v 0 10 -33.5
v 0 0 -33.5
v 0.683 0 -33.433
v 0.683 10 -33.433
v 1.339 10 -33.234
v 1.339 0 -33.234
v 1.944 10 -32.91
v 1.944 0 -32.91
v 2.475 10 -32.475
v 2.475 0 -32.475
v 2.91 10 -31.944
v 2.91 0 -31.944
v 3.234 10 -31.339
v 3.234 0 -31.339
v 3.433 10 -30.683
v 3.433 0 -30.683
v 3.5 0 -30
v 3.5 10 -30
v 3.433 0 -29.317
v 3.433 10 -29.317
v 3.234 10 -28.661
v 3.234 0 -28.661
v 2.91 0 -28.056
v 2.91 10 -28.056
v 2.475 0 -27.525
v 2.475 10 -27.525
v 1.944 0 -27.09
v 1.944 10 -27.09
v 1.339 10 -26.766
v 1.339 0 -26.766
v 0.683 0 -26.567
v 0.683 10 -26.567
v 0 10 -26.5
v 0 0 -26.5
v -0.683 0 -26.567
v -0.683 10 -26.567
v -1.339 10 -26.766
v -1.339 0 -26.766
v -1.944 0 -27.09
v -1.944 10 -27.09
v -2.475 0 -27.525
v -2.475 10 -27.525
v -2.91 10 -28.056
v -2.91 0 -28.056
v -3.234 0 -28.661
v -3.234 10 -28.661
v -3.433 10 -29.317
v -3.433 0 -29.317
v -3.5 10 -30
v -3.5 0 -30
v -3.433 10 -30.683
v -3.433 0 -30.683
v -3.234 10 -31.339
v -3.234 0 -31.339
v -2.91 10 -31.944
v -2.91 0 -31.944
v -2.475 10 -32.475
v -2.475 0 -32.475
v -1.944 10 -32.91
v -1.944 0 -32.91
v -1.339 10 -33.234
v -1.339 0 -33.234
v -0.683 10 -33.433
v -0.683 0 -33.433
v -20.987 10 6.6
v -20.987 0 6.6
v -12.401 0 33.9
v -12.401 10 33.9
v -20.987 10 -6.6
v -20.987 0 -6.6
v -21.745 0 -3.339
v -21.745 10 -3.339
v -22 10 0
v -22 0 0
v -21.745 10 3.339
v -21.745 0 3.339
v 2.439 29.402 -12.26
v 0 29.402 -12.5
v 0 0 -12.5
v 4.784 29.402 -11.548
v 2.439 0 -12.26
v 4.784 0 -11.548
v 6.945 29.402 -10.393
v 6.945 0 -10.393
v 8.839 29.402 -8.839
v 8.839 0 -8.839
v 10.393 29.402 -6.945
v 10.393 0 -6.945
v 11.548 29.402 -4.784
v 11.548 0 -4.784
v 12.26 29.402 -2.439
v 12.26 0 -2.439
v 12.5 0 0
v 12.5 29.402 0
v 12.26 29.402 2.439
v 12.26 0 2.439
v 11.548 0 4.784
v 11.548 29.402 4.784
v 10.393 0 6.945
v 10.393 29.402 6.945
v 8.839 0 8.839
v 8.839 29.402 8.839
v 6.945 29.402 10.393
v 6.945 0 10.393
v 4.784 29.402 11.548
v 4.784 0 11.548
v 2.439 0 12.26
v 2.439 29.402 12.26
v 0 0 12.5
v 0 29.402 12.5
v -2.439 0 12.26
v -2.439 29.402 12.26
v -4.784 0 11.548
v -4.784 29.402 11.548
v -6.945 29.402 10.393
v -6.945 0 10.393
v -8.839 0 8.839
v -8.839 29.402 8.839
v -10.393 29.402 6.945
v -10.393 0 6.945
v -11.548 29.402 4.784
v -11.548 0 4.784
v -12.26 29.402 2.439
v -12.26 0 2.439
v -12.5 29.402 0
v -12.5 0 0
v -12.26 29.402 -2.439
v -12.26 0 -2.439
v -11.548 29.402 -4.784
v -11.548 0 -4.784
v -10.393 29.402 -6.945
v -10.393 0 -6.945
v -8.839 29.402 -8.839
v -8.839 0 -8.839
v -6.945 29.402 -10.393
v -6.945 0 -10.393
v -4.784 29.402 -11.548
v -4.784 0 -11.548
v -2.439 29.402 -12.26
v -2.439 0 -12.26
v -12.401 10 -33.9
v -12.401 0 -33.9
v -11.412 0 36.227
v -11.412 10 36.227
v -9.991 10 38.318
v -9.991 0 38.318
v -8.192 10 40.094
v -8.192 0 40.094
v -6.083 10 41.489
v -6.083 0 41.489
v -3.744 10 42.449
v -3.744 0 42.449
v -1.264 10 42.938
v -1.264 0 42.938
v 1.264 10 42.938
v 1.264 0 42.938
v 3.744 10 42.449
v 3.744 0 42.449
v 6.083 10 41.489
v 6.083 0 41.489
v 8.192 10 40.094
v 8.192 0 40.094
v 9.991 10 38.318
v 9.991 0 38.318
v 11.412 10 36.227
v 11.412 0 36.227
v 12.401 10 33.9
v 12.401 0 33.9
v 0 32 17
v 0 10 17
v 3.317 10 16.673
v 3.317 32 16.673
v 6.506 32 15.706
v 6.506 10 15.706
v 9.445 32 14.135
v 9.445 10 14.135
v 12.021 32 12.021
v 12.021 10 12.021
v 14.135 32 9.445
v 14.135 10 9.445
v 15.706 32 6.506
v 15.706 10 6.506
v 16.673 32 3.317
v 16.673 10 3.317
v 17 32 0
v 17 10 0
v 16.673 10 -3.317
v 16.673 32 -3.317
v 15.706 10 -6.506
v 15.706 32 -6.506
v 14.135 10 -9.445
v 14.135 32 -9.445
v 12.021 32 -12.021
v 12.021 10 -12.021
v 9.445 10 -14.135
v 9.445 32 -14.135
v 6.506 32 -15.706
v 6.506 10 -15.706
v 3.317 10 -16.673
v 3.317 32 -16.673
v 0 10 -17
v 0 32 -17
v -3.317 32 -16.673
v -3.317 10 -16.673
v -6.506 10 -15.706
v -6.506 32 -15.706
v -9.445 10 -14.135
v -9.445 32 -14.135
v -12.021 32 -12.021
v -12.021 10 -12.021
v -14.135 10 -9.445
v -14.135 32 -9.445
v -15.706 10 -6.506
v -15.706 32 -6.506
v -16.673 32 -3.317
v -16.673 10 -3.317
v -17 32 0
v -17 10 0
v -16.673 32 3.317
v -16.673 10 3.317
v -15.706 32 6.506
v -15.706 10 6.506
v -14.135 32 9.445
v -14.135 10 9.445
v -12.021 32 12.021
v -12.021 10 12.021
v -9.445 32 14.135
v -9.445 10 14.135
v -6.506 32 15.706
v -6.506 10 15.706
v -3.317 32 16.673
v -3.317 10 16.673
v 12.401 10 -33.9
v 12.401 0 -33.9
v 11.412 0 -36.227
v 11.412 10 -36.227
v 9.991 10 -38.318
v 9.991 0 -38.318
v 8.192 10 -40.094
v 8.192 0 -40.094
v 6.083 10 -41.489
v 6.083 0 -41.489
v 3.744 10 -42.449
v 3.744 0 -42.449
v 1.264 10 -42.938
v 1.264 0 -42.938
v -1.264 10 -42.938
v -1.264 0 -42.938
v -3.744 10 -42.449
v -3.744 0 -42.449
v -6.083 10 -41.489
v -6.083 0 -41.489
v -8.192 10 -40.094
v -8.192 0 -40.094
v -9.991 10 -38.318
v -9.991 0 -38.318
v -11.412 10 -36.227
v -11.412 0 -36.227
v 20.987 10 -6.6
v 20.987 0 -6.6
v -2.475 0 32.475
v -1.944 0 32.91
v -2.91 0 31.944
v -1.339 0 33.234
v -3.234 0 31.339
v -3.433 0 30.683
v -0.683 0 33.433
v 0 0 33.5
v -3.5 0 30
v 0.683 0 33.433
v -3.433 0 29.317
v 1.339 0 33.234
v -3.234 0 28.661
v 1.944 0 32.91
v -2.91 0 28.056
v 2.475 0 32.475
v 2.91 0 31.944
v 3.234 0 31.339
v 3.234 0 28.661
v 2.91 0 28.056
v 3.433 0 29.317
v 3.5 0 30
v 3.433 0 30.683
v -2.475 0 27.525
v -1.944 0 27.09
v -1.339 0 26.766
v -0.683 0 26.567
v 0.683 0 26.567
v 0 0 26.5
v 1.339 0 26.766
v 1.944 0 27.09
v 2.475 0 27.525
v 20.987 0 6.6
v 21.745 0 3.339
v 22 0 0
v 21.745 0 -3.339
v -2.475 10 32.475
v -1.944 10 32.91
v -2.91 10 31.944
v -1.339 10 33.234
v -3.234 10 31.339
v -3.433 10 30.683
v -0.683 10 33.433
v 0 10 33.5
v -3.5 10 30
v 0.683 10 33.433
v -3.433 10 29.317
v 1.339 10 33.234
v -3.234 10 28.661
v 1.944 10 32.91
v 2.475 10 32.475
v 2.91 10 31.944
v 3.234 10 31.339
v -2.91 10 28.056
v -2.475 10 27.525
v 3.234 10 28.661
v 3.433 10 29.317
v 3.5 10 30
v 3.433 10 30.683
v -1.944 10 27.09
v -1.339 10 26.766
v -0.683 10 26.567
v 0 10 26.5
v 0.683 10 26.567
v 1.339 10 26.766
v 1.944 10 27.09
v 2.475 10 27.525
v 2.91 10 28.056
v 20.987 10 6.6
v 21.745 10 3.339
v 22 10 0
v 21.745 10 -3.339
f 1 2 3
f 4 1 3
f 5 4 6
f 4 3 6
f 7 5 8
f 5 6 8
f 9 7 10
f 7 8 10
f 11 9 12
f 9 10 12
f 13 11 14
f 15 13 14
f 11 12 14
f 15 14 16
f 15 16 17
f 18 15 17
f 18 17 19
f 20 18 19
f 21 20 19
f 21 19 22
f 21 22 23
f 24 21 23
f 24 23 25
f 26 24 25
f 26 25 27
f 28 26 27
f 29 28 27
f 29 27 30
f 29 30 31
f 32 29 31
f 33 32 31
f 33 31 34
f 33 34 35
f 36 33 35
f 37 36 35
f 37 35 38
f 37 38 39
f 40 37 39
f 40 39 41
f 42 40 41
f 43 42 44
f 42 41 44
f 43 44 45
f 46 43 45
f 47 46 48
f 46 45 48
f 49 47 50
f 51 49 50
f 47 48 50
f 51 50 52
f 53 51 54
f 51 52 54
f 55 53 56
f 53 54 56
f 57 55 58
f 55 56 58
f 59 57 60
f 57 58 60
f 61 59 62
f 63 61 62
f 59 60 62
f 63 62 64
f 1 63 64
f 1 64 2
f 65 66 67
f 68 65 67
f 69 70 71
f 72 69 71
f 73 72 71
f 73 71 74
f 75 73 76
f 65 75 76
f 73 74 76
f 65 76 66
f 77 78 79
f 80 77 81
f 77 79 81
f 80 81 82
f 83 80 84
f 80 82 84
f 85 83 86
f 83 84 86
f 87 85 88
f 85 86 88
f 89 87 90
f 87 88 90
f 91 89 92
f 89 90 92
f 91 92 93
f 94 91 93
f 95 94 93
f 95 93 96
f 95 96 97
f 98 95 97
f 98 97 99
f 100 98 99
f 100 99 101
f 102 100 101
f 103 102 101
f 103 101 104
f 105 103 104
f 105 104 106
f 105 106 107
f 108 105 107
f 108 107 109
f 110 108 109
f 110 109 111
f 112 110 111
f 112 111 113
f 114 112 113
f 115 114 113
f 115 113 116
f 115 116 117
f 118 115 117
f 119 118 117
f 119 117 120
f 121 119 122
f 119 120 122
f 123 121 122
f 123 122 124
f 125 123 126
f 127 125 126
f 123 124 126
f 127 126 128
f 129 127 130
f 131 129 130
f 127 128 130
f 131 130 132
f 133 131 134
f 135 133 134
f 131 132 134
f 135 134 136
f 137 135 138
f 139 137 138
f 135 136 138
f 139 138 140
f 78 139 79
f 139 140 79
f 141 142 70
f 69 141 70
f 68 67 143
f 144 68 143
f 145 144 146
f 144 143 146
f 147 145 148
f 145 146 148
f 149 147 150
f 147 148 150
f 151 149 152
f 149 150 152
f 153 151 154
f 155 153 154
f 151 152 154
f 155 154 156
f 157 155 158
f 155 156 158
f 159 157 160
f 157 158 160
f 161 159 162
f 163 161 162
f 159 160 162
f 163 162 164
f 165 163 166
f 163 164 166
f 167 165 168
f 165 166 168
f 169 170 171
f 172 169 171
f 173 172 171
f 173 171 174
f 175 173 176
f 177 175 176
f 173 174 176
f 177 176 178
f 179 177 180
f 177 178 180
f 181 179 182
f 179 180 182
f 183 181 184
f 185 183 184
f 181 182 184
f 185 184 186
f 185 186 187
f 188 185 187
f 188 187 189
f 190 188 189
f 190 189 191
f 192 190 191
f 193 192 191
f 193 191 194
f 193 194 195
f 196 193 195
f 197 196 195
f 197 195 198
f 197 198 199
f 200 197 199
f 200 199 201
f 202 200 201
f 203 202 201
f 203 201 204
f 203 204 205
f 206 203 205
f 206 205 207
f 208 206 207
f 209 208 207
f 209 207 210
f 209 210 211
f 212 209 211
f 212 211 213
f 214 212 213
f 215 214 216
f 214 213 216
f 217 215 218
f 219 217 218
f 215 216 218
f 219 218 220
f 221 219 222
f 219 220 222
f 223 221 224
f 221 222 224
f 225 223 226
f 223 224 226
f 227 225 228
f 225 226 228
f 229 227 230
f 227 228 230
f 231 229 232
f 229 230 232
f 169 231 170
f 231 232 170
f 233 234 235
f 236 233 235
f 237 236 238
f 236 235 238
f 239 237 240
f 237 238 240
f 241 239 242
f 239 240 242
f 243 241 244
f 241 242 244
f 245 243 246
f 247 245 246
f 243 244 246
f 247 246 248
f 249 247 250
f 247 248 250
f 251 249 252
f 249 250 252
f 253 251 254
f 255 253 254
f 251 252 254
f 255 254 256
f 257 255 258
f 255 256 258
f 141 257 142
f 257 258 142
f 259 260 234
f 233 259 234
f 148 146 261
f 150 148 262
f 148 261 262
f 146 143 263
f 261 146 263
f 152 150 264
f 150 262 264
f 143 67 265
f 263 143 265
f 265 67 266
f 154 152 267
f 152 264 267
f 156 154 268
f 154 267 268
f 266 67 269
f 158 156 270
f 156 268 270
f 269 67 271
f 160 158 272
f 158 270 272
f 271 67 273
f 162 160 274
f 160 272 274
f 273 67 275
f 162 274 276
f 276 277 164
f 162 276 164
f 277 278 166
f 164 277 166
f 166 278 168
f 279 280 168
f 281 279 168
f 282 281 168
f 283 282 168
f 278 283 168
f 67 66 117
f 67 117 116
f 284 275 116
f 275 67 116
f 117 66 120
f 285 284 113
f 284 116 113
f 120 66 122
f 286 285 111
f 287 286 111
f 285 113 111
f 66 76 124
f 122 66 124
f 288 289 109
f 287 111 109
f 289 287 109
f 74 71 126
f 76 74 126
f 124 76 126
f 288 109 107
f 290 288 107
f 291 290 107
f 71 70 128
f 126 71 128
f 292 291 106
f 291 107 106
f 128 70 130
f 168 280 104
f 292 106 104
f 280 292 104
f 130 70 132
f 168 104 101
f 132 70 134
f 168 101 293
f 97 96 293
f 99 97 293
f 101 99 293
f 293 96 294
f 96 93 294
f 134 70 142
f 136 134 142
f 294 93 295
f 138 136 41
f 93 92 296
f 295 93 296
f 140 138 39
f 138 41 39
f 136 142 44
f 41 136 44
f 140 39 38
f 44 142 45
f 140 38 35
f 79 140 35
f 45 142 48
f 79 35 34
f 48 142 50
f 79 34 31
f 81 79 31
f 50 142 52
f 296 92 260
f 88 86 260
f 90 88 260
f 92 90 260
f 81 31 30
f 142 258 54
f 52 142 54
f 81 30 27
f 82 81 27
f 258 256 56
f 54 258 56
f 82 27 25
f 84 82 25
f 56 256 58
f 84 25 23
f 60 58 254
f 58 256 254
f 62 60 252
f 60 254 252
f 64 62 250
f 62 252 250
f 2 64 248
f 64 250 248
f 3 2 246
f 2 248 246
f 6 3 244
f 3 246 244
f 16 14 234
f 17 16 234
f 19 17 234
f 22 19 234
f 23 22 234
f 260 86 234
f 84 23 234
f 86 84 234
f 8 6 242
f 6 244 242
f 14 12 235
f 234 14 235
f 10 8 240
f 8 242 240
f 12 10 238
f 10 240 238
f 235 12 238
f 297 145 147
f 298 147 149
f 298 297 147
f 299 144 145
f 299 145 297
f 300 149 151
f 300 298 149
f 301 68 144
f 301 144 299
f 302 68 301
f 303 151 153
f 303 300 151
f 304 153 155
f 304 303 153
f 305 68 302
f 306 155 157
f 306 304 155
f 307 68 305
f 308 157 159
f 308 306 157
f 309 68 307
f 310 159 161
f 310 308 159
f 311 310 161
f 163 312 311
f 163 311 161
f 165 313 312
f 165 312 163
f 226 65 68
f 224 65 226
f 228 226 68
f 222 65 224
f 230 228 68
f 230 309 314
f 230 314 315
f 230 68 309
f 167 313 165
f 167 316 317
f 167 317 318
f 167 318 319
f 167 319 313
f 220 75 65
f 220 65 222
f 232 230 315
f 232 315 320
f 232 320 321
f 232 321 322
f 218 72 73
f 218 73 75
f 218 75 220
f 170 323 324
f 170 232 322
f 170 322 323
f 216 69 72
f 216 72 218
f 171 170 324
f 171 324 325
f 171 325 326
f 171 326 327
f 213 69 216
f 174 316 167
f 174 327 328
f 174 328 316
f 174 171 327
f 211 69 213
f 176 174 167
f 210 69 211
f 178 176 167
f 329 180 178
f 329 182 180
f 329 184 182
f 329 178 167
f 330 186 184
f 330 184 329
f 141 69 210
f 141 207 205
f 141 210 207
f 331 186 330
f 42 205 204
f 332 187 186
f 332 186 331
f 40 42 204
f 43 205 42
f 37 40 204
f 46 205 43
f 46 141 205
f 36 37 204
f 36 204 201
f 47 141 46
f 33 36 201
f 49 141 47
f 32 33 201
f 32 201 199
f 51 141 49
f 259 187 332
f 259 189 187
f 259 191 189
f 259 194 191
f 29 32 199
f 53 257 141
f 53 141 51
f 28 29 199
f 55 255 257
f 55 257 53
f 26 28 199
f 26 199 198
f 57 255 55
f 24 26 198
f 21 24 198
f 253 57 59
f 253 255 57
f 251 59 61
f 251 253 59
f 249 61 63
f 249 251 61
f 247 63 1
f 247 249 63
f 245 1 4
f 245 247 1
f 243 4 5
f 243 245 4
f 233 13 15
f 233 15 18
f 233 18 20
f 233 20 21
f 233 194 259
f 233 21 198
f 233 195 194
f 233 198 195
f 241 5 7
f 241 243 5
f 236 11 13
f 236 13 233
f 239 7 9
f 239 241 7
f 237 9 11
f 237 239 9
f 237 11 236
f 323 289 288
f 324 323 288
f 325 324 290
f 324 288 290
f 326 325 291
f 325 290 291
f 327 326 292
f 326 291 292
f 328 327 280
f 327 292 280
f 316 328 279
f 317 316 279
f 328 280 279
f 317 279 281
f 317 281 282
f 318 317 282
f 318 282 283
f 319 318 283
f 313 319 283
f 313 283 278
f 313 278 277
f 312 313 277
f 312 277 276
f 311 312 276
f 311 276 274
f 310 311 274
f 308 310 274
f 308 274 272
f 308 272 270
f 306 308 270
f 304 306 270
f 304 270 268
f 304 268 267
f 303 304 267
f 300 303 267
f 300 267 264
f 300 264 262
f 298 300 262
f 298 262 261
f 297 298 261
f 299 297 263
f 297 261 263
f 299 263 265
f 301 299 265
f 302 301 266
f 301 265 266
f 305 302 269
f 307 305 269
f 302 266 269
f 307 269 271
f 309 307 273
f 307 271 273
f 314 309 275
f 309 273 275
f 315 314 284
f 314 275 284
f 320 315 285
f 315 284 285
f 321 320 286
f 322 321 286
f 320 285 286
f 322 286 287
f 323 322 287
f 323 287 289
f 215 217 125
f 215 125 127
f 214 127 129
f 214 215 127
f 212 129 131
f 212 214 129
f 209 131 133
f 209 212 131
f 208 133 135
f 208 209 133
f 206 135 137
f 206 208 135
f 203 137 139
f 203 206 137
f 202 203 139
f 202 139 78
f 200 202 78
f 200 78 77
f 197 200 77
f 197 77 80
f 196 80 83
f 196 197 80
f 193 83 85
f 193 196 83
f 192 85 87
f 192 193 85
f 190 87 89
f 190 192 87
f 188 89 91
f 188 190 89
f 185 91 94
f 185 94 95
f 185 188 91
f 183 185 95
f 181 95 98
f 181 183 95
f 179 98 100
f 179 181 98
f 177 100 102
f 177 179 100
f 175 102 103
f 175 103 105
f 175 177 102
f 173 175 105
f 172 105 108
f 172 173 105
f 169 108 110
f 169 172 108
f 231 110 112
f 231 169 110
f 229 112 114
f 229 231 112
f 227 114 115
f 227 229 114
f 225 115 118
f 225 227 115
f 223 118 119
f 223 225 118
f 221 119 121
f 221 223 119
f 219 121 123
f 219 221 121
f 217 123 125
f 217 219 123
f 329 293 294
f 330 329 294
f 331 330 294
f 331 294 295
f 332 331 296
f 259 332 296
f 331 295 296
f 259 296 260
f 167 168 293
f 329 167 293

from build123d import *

# Parameters (mm, degrees)
EXTRUDE_1_DEPTH = 10
SKETCH_2_R      = 17
EXTRUDE_2_DEPTH = 22
MM_1_D          = 7
MM_2_D          = 25


with BuildPart() as part:
    # 草图1 → 凸台-拉伸1 (new body)
    with BuildSketch(Plane(origin=(0, 0, 0), x_dir=(1, 0, 0), z_dir=(0, 1, 0))):
        with BuildLine():
            Line((-12.401209618, 33.9), (-20.986662431, 6.6))
            ThreePointArc((-20.986662431, 6.6), (0, -22), (20.986662431, 6.6))
            Line((20.986662431, 6.6), (12.401209618, 33.9))
            ThreePointArc((12.401209618, 33.9), (0, 43), (-12.401209618, 33.9))
        make_face()
        with BuildLine():
            Line((12.401209618, -33.9), (20.986662431, -6.6))
            ThreePointArc((20.986662431, -6.6), (0, 22), (-20.986662431, -6.6))
            Line((-20.986662431, -6.6), (-12.401209618, -33.9))
            ThreePointArc((-12.401209618, -33.9), (0, -43), (12.401209618, -33.9))
        make_face()
    extrude(amount=EXTRUDE_1_DEPTH)

    # 草图2 → 凸台-拉伸2 (add)
    with BuildSketch(Plane(origin=(0, 10, 0), x_dir=(1, 0, 0), z_dir=(0, 1, 0))):
        with Locations(Location((0, 0, 0), (0, 0, 270))):
            Circle(SKETCH_2_R)
    extrude(amount=EXTRUDE_2_DEPTH)

    # 大小mm 暗销孔1 (through all)
    with Locations(Plane(origin=(0, 10, -30), x_dir=(0, 0, 1), z_dir=(0, 1, 0))):
        with Locations((0, 0), (60, 0)):
            Hole(MM_1_D / 2)

    # 大小mm 暗销孔2 (through all)
    with Locations(Plane.ZX.offset(32)):
        with Locations((0, 0)):
            Hole(MM_2_D / 2)

    # 草图5 → 切除-旋转1 (revolve, cut)
    with BuildSketch(Plane.XY, mode=Mode.PRIVATE) as cut_revolve_1_sk:
        Polygon((0, 22.185045424), (17, 32), (17, 40.592960663), (0, 40.592960663), align=None)
    revolve(cut_revolve_1_sk.sketch.rotate(Axis((0, 32, 0), (0, -1, 0)), 180), axis=Axis((0, 32, 0), (0, -1, 0)), mode=Mode.SUBTRACT)


solid = part.part
